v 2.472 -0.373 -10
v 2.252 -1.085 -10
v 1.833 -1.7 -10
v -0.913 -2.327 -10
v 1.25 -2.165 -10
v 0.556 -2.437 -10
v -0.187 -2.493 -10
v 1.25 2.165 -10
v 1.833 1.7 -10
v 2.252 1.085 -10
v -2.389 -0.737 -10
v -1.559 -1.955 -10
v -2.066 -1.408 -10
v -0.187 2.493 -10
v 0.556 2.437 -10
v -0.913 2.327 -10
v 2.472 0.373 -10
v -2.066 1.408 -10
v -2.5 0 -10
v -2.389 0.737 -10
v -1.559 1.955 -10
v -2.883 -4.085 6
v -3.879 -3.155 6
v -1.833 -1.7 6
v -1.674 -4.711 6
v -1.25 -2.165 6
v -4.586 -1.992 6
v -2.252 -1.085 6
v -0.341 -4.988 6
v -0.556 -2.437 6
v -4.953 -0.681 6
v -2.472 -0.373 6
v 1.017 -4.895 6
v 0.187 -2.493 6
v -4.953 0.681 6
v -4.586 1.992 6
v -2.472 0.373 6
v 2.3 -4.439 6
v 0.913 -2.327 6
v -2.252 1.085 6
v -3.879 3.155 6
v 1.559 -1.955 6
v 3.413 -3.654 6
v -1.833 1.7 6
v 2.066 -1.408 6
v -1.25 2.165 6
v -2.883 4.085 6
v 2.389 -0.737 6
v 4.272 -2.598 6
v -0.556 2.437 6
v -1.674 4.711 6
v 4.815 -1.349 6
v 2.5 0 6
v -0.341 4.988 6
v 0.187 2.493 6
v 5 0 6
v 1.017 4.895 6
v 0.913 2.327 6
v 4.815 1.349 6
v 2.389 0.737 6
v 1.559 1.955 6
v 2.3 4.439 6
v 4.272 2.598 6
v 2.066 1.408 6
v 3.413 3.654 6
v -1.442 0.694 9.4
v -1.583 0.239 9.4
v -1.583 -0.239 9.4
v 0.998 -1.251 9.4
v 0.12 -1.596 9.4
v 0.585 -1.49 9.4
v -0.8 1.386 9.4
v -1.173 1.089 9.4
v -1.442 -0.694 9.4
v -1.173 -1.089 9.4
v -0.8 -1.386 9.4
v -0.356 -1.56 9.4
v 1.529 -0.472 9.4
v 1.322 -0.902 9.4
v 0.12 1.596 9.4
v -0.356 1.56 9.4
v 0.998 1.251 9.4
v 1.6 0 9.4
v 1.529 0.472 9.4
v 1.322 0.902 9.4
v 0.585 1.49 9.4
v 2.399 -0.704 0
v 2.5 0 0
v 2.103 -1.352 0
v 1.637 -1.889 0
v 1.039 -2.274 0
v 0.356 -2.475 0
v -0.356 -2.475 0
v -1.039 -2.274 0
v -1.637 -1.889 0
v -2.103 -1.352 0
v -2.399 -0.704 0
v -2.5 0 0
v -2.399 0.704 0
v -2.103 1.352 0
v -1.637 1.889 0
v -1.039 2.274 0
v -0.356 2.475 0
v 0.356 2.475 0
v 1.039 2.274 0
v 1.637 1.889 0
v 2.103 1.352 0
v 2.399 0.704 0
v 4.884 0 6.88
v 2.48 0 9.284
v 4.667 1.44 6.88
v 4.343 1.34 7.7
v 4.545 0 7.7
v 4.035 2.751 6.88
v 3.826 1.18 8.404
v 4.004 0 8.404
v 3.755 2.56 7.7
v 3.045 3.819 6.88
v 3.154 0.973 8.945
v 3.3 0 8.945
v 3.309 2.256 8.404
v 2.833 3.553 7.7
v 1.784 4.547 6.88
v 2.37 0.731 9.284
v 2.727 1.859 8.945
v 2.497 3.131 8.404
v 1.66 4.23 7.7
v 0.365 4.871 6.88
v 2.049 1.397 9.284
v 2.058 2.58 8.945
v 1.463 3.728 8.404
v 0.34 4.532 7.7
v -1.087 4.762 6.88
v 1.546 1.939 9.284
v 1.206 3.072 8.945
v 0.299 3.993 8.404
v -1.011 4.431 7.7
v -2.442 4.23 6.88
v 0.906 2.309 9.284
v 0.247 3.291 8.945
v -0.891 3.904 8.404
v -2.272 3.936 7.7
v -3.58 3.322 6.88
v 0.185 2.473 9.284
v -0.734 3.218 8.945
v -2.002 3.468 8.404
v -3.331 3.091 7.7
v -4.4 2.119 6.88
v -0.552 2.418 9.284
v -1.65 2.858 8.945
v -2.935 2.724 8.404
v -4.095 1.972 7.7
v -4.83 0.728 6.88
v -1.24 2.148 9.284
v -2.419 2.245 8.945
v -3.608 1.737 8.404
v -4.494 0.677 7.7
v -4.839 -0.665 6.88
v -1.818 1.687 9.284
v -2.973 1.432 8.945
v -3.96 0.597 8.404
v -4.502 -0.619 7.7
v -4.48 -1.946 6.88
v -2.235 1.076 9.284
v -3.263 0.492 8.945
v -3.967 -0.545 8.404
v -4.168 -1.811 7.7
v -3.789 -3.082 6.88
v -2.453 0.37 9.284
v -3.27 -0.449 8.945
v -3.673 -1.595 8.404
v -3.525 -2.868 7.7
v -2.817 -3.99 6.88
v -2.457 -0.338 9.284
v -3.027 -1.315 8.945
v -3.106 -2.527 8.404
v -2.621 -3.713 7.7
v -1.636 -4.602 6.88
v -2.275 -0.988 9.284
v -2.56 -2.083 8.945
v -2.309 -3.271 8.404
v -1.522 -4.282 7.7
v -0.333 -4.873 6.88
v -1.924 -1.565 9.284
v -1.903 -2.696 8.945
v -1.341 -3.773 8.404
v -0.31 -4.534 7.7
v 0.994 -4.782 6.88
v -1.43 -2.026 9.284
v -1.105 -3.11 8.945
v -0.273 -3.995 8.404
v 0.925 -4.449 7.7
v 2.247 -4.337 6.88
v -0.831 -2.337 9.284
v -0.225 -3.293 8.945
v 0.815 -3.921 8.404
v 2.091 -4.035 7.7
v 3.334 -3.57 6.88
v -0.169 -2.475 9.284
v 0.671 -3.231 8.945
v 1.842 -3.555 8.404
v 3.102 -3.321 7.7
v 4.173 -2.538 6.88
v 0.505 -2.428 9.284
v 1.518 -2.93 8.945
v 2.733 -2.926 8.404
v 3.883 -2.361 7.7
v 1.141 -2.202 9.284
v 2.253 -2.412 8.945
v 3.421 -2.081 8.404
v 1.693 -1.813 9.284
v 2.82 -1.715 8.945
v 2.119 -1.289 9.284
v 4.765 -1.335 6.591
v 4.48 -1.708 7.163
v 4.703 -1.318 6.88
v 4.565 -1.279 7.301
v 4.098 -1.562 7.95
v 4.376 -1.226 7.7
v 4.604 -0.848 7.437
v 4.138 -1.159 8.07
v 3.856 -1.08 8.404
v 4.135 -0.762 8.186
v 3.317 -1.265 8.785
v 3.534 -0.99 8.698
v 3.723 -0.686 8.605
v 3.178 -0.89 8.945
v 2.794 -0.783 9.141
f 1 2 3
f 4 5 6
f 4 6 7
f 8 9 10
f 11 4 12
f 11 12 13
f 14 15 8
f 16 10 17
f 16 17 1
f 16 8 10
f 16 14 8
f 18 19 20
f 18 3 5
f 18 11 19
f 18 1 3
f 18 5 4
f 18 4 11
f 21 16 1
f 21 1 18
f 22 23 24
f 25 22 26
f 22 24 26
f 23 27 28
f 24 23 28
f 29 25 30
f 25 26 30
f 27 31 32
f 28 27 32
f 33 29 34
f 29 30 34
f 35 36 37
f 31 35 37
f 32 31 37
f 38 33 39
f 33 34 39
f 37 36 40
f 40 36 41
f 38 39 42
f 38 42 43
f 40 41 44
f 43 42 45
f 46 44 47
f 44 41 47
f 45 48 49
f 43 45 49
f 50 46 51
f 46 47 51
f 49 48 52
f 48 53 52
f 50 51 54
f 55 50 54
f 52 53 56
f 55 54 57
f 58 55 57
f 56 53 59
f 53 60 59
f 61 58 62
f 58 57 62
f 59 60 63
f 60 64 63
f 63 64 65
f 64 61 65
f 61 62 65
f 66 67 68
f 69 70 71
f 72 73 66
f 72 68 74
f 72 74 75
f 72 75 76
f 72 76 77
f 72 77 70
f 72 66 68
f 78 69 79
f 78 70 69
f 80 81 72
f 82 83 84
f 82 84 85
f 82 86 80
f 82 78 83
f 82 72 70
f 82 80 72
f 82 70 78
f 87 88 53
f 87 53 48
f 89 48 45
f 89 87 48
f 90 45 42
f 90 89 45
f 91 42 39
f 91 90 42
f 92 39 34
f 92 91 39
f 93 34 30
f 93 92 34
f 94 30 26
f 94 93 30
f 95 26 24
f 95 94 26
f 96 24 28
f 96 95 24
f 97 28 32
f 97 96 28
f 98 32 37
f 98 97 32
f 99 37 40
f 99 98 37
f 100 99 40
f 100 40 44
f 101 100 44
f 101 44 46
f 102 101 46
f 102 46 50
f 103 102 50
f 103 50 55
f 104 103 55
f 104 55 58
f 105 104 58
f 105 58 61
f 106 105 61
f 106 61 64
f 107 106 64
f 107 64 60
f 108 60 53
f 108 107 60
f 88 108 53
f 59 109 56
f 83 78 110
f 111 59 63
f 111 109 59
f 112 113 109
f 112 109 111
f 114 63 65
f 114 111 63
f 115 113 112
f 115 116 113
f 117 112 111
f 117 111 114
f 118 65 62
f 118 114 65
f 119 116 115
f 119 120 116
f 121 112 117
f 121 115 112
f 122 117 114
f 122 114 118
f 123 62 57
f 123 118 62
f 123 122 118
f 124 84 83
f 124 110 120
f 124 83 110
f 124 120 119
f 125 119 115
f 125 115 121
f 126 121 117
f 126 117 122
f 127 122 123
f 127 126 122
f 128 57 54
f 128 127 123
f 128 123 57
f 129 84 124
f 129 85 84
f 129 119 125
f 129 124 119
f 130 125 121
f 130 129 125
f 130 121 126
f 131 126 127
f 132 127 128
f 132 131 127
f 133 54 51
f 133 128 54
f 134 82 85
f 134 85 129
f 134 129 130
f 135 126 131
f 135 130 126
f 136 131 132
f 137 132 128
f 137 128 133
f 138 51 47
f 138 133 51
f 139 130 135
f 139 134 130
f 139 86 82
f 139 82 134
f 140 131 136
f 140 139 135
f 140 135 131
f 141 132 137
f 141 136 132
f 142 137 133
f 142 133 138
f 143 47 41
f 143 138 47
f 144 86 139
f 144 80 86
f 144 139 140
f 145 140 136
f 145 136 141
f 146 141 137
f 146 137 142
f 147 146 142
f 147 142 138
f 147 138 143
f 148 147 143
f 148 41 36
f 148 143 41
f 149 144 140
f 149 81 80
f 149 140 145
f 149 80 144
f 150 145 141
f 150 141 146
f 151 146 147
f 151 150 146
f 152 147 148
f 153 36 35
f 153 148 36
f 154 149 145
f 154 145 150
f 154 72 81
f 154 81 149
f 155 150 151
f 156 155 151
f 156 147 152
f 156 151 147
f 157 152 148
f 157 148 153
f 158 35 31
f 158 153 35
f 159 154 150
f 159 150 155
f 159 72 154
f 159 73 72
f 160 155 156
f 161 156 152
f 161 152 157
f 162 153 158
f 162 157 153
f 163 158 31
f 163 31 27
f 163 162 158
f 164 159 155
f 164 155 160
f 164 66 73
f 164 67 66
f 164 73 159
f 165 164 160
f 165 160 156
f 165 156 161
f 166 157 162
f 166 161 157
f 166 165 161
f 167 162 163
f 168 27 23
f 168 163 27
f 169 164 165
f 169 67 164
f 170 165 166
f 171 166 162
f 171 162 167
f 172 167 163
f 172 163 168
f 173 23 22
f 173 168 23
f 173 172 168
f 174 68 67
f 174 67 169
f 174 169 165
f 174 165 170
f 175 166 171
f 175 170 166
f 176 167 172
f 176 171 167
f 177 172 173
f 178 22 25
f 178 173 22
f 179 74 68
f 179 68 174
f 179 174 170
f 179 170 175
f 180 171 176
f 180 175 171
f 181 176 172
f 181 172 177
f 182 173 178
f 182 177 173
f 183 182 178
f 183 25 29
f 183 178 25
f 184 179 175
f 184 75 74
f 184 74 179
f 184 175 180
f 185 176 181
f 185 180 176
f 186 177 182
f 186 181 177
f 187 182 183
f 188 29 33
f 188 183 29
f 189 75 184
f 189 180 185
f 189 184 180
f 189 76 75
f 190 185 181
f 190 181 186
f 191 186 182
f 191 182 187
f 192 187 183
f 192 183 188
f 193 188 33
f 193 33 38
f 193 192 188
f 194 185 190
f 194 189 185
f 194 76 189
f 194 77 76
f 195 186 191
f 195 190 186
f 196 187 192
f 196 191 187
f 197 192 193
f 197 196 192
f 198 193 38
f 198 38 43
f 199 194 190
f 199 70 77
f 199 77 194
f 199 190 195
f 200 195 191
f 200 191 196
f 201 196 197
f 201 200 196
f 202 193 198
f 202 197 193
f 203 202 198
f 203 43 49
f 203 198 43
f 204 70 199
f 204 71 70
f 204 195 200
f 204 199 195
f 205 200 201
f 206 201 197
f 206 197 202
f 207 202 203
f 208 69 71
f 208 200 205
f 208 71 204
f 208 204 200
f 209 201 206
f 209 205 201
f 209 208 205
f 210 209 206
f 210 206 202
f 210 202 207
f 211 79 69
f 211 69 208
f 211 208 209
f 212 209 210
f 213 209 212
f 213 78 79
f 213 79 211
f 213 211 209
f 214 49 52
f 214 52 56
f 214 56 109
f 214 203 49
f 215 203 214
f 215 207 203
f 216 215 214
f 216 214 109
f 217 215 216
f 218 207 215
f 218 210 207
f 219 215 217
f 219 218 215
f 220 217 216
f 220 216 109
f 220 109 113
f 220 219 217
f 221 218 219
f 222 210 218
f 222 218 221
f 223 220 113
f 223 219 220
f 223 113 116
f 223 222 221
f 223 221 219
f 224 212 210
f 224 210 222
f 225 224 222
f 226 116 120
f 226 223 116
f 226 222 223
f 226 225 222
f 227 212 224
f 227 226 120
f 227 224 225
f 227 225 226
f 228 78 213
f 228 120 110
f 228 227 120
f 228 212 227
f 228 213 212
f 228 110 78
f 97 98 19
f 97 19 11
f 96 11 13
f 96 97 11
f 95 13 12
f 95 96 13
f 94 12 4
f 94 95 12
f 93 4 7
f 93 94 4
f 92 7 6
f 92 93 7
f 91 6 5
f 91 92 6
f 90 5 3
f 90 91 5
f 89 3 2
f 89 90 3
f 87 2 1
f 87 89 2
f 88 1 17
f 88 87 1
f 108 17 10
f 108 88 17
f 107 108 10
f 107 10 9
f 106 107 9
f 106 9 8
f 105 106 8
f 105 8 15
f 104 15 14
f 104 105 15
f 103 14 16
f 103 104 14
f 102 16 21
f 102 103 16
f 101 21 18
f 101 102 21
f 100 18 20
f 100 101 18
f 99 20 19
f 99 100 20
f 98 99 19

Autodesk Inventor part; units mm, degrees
ref_plane "YZ Plane" through (0, 0, 0) normal (1, 0, 0) x (0, 1, 0)
ref_plane "XZ Plane" through (0, 0, 0) normal (0, 1, 0) x (-1, 0, 0)
ref_plane "XY Plane" through (0, 0, 0) normal (0, 0, 1) x (1, 0, 0)
sketch "スケッチ1" plane through (0, 0, 0) normal (0, 0, 1) x (1, 0, 0)
  circle A0 centre (0, 0) radius 2.5
  dimension "d0" = 5
extrude "押し出し1" add sketch "スケッチ1" along normal blind 6
sketch "スケッチ2" plane through (0, 0, 6) normal (0, 0, 1) x (1, 0, 0)
  circle A0 centre (0, 0) radius 2.5 projected
  circle A1 centre (0, 0) radius 5
  dimension "d3" = 10
extrude "押し出し2" add sketch "スケッチ2" along normal blind 3.4 contours A0 | A1
fillet "フィレット1" radius 3.4 1 edges at (-5, 0, 9.4)
thread "ねじ1" size "M3x0.5" class "6g" standard "ANSI Metric M Profile" full length
sketch "スケッチ3" plane through (0, 0, 0) normal (0, 0, -1) x (-1, 0, 0)
  circle A0 centre (0, 0) radius 2.5 projected
extrude "押し出し3" add sketch "スケッチ3" along normal blind 10
properties part number "SB　M5 16mmなべネジ" material "Steel, Mild"
